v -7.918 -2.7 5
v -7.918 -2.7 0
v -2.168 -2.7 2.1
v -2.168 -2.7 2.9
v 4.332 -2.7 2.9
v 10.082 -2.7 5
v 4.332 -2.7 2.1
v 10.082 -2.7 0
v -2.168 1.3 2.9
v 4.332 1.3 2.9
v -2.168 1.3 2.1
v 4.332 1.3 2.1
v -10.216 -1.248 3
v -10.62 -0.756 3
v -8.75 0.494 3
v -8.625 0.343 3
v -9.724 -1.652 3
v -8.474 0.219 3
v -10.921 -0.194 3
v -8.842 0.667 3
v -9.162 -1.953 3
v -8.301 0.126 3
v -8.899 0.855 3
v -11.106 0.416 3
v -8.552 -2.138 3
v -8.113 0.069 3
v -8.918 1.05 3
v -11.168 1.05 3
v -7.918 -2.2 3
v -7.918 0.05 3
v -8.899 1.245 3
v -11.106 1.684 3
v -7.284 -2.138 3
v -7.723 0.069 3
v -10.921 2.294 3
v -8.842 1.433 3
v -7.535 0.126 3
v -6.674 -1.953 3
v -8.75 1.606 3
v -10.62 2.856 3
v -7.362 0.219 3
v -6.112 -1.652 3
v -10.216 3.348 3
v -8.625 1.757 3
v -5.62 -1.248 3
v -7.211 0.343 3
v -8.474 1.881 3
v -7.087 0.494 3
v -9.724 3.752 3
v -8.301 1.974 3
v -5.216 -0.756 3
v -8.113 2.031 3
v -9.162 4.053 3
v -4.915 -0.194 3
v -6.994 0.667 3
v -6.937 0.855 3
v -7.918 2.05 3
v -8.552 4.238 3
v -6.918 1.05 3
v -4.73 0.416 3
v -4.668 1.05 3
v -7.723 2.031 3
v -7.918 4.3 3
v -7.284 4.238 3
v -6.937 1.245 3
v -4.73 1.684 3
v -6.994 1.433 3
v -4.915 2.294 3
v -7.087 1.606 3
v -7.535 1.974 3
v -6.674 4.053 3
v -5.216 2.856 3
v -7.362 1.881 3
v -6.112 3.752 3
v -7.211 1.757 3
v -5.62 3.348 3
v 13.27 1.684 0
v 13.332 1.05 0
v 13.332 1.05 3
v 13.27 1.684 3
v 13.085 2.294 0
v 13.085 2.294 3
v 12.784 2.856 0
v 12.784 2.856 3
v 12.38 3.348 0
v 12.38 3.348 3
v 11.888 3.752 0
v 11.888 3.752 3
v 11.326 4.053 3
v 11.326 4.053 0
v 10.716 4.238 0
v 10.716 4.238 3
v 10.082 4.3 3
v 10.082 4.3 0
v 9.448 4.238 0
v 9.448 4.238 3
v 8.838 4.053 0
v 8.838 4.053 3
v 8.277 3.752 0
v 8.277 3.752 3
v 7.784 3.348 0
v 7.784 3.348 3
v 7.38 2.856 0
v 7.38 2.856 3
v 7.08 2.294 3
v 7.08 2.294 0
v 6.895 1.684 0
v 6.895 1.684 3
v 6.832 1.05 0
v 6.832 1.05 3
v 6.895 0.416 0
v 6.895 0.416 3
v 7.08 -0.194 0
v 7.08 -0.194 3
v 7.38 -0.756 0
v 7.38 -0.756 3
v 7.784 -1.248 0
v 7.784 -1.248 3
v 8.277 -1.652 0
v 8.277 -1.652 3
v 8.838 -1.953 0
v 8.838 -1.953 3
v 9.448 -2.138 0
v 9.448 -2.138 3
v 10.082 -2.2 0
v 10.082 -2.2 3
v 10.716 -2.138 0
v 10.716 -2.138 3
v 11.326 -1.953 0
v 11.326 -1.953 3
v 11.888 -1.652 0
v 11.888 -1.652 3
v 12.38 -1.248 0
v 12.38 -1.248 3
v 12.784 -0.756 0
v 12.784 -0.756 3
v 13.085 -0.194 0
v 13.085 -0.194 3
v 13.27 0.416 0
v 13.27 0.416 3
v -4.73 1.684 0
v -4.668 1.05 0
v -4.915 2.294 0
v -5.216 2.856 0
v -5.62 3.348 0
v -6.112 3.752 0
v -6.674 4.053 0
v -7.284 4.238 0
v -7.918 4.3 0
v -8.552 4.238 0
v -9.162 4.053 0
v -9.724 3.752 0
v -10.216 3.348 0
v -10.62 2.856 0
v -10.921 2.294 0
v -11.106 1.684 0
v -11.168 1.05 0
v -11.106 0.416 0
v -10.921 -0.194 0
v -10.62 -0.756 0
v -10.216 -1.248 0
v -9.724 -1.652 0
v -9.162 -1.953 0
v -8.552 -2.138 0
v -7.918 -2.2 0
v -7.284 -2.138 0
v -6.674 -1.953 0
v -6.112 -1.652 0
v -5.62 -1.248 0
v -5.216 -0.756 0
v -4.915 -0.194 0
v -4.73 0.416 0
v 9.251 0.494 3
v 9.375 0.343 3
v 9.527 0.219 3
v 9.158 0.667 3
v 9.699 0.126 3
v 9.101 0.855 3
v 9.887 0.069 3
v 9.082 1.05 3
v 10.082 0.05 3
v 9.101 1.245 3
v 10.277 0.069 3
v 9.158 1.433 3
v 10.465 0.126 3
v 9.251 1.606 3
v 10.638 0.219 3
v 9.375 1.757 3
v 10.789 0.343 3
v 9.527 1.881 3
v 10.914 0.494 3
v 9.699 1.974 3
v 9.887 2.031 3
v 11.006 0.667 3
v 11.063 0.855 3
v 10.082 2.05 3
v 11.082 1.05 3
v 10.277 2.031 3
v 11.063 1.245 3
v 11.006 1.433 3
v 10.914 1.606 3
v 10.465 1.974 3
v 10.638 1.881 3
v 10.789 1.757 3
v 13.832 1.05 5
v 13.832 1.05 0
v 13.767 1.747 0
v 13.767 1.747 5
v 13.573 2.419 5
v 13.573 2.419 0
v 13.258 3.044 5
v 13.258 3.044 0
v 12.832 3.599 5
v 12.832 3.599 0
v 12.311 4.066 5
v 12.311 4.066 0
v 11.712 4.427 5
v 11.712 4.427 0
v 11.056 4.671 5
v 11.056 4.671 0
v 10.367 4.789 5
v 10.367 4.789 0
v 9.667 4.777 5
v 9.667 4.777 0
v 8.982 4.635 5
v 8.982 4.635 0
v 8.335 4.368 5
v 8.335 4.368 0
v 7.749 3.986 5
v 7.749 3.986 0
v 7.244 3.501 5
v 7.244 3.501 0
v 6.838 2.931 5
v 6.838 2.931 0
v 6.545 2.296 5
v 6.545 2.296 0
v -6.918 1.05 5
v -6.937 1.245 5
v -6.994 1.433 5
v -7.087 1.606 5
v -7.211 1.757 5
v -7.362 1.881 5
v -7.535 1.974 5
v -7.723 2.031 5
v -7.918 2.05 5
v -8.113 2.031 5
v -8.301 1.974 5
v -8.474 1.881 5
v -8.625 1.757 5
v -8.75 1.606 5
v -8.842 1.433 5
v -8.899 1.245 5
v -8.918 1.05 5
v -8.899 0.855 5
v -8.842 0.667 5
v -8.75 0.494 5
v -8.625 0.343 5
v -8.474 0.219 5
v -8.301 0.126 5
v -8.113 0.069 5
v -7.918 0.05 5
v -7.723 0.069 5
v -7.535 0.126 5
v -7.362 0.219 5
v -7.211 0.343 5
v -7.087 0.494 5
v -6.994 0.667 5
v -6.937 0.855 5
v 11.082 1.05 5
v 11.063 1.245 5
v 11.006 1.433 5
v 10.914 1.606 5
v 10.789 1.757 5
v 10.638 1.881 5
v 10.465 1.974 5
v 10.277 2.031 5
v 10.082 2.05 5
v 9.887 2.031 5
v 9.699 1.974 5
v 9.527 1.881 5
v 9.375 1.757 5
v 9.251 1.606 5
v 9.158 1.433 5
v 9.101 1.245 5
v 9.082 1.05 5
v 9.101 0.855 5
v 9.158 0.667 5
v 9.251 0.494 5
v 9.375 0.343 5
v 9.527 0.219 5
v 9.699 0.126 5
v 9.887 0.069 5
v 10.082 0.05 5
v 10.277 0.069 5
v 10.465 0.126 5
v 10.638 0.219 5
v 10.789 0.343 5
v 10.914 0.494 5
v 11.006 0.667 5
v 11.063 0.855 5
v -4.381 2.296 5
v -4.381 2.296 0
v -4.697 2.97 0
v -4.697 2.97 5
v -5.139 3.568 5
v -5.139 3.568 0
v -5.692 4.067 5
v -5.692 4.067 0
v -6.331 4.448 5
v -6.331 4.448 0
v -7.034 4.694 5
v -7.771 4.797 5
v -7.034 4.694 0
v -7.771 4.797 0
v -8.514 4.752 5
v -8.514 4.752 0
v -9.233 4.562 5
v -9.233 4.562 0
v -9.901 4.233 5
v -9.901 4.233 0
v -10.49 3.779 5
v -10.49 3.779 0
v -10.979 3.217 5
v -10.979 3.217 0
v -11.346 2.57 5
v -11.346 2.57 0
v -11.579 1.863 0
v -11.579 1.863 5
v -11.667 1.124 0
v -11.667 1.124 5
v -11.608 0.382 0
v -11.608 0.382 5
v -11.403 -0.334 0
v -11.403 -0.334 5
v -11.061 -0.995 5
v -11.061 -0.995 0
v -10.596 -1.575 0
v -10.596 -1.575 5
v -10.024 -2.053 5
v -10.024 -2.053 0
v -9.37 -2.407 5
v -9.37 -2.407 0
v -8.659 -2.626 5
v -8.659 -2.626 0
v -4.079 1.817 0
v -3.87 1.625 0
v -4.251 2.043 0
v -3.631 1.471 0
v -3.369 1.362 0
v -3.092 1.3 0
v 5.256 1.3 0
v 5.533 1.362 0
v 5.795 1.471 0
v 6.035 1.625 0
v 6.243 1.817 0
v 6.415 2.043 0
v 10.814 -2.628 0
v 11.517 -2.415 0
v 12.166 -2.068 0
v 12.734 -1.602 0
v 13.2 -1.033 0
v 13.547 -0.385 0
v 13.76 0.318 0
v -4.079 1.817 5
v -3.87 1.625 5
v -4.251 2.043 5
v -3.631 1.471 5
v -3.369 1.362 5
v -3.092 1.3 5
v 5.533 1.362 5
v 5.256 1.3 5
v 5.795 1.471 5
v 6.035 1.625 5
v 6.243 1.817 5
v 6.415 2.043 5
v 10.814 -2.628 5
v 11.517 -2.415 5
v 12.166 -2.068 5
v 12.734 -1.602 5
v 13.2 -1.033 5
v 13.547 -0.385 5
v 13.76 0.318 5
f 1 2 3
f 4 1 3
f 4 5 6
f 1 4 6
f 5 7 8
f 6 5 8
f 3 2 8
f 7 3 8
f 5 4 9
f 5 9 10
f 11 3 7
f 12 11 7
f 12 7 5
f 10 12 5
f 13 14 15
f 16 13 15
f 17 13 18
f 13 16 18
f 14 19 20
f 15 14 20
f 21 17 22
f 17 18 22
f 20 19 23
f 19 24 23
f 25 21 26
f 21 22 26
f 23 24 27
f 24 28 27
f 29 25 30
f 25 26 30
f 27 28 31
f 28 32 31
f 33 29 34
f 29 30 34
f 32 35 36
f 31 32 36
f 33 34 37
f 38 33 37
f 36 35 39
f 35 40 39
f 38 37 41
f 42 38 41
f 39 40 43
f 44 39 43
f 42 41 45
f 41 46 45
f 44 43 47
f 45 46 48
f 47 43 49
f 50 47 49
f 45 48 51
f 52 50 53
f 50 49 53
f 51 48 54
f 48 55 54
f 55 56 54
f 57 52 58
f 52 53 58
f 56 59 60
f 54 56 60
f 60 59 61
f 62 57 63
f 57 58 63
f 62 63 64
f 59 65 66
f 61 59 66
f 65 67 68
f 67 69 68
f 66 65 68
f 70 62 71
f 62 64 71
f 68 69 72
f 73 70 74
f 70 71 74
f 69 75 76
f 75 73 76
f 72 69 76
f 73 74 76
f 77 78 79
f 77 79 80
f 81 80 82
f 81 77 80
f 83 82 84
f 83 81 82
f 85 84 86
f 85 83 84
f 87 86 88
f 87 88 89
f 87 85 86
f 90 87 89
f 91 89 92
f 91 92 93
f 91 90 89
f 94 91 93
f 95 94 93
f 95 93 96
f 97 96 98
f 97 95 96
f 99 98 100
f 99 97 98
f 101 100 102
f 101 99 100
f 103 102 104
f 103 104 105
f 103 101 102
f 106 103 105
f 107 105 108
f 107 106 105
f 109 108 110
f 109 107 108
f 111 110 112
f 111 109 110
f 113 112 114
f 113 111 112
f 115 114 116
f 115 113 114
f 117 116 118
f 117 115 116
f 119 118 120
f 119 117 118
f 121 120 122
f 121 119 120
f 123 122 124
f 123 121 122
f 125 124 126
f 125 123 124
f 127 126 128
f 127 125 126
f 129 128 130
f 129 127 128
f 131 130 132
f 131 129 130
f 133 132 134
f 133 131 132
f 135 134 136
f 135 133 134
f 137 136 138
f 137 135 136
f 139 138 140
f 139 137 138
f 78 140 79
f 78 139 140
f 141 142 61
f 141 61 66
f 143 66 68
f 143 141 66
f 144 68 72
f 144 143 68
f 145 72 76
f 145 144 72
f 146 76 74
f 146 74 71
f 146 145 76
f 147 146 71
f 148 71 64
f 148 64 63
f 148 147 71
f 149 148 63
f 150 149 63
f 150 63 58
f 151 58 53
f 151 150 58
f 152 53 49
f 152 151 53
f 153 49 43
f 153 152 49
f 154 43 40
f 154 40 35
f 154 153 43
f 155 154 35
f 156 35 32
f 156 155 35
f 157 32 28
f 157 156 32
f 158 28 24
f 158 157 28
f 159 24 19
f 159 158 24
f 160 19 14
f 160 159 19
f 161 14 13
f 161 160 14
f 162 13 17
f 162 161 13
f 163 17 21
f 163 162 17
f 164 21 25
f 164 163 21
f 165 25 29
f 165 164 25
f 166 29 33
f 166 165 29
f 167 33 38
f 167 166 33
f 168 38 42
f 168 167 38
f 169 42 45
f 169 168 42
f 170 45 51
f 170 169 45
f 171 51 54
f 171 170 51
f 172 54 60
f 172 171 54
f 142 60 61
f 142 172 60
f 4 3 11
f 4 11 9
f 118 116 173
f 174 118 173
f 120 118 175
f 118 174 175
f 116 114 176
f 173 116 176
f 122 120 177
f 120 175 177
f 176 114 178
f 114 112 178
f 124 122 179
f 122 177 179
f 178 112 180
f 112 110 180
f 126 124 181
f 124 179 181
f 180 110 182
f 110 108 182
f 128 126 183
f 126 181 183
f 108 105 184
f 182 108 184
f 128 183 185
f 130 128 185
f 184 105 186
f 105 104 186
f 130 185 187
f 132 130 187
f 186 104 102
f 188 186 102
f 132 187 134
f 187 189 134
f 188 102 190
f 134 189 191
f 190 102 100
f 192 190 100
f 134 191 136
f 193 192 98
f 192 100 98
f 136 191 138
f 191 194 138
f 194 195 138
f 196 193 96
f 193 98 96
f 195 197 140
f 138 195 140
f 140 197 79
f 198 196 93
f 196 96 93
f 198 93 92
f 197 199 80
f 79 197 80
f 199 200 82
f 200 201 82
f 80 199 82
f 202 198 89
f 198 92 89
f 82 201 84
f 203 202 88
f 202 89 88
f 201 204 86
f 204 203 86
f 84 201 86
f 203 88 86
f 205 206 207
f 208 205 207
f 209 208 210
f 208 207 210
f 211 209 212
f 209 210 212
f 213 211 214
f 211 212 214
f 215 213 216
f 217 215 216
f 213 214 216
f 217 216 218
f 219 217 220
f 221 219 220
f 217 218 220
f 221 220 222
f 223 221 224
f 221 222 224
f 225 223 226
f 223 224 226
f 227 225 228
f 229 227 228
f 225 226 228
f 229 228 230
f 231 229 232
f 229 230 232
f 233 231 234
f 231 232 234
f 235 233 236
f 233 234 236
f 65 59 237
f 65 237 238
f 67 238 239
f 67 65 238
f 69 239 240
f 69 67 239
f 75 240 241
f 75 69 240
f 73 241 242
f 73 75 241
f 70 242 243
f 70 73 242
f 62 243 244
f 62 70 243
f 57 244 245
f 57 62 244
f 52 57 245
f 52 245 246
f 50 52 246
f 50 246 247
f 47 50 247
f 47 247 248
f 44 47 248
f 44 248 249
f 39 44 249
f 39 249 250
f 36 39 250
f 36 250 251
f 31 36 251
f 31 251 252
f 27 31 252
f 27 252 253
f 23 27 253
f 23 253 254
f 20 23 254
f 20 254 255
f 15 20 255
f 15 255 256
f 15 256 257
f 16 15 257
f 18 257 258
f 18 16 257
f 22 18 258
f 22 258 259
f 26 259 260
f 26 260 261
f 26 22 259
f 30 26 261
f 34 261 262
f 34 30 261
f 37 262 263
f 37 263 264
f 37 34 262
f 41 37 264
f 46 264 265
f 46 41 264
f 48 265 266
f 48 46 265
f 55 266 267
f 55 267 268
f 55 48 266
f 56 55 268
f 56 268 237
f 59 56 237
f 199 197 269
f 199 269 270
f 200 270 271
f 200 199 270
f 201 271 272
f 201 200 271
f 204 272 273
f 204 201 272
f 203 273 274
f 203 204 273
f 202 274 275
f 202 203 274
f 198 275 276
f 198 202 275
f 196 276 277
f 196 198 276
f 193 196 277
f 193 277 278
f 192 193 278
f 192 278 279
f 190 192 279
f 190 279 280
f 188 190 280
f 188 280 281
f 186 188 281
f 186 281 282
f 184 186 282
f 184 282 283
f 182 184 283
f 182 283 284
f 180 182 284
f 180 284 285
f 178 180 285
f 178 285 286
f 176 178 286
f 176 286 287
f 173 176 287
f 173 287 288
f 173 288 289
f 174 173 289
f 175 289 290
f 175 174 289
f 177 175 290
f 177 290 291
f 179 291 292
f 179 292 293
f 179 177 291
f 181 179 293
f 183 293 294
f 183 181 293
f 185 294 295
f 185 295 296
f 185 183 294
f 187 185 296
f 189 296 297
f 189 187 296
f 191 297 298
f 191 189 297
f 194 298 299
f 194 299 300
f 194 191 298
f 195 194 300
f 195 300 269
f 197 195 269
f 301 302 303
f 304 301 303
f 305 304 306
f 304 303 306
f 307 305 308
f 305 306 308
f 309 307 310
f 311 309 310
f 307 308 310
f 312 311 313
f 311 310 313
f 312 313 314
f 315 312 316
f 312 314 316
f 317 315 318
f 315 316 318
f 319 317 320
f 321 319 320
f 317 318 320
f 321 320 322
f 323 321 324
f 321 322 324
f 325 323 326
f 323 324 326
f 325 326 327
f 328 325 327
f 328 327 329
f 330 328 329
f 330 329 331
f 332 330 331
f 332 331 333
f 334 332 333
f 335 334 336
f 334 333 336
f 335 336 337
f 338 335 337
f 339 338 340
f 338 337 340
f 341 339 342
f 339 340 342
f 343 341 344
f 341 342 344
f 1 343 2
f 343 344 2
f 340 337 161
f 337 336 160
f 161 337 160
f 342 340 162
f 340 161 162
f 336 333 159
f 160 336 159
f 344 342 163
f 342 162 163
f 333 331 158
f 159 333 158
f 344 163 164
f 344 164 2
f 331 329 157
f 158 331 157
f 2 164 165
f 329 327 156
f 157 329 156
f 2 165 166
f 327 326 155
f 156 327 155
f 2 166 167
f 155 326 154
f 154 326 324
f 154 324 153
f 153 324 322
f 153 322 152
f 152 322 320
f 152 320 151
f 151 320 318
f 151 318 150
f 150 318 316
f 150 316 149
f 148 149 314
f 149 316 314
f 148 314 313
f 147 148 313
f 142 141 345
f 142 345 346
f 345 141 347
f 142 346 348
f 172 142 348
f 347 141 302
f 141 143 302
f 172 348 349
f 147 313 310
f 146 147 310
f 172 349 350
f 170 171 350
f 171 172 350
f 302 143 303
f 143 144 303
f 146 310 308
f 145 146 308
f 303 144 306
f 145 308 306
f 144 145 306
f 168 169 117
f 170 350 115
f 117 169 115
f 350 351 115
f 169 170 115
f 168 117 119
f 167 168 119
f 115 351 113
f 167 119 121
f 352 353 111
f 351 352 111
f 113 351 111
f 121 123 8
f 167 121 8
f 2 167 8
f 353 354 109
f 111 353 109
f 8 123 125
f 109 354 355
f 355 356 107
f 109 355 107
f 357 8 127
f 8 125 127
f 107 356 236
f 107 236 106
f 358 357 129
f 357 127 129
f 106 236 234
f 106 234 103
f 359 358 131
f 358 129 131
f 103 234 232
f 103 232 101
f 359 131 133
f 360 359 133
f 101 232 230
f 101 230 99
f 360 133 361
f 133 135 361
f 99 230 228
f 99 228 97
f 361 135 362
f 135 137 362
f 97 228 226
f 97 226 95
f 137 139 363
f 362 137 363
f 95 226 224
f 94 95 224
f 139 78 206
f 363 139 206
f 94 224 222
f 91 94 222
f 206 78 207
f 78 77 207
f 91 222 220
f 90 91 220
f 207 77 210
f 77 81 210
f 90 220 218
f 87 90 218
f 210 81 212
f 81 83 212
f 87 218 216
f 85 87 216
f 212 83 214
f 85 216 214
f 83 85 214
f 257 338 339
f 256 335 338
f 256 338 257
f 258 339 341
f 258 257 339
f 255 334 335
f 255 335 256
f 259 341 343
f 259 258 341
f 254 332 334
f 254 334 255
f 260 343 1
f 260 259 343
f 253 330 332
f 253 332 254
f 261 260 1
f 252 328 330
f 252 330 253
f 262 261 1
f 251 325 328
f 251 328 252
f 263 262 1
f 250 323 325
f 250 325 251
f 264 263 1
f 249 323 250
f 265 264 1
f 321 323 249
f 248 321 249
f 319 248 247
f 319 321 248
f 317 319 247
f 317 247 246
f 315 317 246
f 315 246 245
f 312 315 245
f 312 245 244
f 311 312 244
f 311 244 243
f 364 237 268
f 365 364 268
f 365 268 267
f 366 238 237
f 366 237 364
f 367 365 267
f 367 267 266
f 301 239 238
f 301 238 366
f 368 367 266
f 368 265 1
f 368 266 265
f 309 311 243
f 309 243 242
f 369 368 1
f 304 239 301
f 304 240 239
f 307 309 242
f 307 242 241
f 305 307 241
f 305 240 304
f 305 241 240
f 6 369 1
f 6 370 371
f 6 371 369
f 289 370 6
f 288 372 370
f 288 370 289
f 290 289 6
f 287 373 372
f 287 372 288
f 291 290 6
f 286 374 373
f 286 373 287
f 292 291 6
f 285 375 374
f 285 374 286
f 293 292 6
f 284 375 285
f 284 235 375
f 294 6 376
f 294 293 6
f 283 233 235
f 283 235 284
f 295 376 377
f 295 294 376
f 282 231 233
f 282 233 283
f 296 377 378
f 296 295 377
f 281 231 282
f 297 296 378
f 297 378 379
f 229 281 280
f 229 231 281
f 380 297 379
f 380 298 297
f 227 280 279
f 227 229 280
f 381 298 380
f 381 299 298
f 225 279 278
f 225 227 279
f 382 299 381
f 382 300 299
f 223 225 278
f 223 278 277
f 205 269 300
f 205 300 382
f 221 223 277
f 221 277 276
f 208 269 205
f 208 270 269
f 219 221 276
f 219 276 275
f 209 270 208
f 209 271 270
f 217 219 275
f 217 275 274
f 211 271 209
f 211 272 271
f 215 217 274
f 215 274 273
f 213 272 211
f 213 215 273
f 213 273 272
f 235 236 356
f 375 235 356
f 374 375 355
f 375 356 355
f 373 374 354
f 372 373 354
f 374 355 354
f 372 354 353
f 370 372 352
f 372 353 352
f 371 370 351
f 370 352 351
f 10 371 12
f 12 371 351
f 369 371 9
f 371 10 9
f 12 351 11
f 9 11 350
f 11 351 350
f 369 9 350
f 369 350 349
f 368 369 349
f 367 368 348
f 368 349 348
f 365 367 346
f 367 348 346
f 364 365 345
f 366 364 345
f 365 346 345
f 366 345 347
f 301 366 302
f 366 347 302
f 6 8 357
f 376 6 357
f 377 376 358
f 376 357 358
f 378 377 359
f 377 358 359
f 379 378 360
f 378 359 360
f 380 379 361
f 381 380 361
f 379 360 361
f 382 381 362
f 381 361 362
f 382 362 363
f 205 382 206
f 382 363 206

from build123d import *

# Parameters (mm, degrees)
F0_R     = 3.25
F0_R_2   = 1
F1_DEPTH = 5
F2_DEPTH = 3
F3_W     = 6.5
F3_H     = 0.8
F4_DEPTH = 25


with BuildPart() as f1:
    # F0 (on Top) → F1 (new body)
    with BuildSketch(Plane.XY):
        with BuildLine():
            ThreePointArc((-7.9180477187, -2.6999995224), (-5.2663972893, -1.6016499519), (-4.1680477187, 1.0500004776))
            ThreePointArc((-4.1680477187, 1.0500004776), (-4.1701339523, 1.1750700574), (-4.1763903319, 1.3000004776))
            ThreePointArc((-4.1763903319, 1.3000004776), (-4.2448197056, 1.8049150184), (-4.3810640575, 2.2958923592))
            ThreePointArc((-4.3810640575, 2.2958923592), (-10.9786517895, 3.2168421243), (-7.9180477187, -2.6999995224))
        make_face()
        with Locations((-7.9180477187, 1.0500004776)):
            Circle(F0_R, mode=Mode.SUBTRACT)
        with Locations((-7.9180477187, 1.0500004776)):
            Circle(F0_R)
        with Locations((-7.9180477187, 1.0500004776)):
            Circle(F0_R_2, mode=Mode.SUBTRACT)
        with BuildLine():
            ThreePointArc((6.3404704502, 1.3000004776), (7.3435150495, -1.5117372139), (10.082127837, -2.6999995224))
            ThreePointArc((10.082127837, -2.6999995224), (12.7337782665, -1.6016499519), (13.832127837, 1.0500004776))
            ThreePointArc((13.832127837, 1.0500004776), (10.7141133078, 4.7463627927), (6.5451441758, 2.2958923592))
            ThreePointArc((6.5451441758, 2.2958923592), (6.4088998239, 1.8049150184), (6.3404704502, 1.3000004776))
        make_face()
        with Locations((10.082127837, 1.0500004776)):
            Circle(F0_R, mode=Mode.SUBTRACT)
        with Locations((10.082127837, 1.0500004776)):
            Circle(F0_R)
        with Locations((10.082127837, 1.0500004776)):
            Circle(F0_R_2, mode=Mode.SUBTRACT)
        with BuildLine():
            ThreePointArc((-4.1763903319, 1.3000004776), (-4.1701339523, 1.1750700574), (-4.1680477187, 1.0500004776))
            ThreePointArc((-4.1680477187, 1.0500004776), (-5.2663972893, -1.6016499519), (-7.9180477187, -2.6999995224))
            Line((-7.9180477187, -2.6999995224), (10.082127837, -2.6999995224))
            ThreePointArc((10.082127837, -2.6999995224), (7.3435150495, -1.5117372139), (6.3404704502, 1.3000004776))
            Line((6.3404704502, 1.3000004776), (5.2561087846, 1.3000004776))
            Line((5.2561087846, 1.3000004776), (-3.0920286663, 1.3000004776))
            Line((-3.0920286663, 1.3000004776), (-4.1763903319, 1.3000004776))
        make_face()
        with BuildLine():
            ThreePointArc((-4.3810640575, 2.2958923592), (-4.2448197056, 1.8049150184), (-4.1763903319, 1.3000004776))
            Line((-4.1763903319, 1.3000004776), (-3.0920286663, 1.3000004776))
            ThreePointArc((-3.0920286663, 1.3000004776), (-3.8704928802, 1.6245723747), (-4.3810640575, 2.2958923592))
        make_face()
        with BuildLine():
            ThreePointArc((6.5451441758, 2.2958923592), (6.0345729985, 1.6245723747), (5.2561087846, 1.3000004776))
            Line((5.2561087846, 1.3000004776), (6.3404704502, 1.3000004776))
            ThreePointArc((6.3404704502, 1.3000004776), (6.4088998239, 1.8049150184), (6.5451441758, 2.2958923592))
        make_face()
    extrude(amount=F1_DEPTH)

    # F0 (on Top) → F2 (cut)
    with BuildSketch(Plane.XY):
        with Locations((10.082127837, 1.0500004776)):
            Circle(F0_R)
        with Locations((10.082127837, 1.0500004776)):
            Circle(F0_R_2, mode=Mode.SUBTRACT)
        with Locations((-7.9180477187, 1.0500004776)):
            Circle(F0_R)
        with Locations((-7.9180477187, 1.0500004776)):
            Circle(F0_R_2, mode=Mode.SUBTRACT)
    extrude(amount=F2_DEPTH, mode=Mode.SUBTRACT)

    # F3 (on face) → F4 (cut)
    with BuildSketch(Plane.XZ.offset(2.6999995224)):
        with Locations((1.0820400592, 2.5)):
            Rectangle(F3_W, F3_H)
    extrude(amount=-F4_DEPTH, mode=Mode.SUBTRACT)


solid = f1.part
